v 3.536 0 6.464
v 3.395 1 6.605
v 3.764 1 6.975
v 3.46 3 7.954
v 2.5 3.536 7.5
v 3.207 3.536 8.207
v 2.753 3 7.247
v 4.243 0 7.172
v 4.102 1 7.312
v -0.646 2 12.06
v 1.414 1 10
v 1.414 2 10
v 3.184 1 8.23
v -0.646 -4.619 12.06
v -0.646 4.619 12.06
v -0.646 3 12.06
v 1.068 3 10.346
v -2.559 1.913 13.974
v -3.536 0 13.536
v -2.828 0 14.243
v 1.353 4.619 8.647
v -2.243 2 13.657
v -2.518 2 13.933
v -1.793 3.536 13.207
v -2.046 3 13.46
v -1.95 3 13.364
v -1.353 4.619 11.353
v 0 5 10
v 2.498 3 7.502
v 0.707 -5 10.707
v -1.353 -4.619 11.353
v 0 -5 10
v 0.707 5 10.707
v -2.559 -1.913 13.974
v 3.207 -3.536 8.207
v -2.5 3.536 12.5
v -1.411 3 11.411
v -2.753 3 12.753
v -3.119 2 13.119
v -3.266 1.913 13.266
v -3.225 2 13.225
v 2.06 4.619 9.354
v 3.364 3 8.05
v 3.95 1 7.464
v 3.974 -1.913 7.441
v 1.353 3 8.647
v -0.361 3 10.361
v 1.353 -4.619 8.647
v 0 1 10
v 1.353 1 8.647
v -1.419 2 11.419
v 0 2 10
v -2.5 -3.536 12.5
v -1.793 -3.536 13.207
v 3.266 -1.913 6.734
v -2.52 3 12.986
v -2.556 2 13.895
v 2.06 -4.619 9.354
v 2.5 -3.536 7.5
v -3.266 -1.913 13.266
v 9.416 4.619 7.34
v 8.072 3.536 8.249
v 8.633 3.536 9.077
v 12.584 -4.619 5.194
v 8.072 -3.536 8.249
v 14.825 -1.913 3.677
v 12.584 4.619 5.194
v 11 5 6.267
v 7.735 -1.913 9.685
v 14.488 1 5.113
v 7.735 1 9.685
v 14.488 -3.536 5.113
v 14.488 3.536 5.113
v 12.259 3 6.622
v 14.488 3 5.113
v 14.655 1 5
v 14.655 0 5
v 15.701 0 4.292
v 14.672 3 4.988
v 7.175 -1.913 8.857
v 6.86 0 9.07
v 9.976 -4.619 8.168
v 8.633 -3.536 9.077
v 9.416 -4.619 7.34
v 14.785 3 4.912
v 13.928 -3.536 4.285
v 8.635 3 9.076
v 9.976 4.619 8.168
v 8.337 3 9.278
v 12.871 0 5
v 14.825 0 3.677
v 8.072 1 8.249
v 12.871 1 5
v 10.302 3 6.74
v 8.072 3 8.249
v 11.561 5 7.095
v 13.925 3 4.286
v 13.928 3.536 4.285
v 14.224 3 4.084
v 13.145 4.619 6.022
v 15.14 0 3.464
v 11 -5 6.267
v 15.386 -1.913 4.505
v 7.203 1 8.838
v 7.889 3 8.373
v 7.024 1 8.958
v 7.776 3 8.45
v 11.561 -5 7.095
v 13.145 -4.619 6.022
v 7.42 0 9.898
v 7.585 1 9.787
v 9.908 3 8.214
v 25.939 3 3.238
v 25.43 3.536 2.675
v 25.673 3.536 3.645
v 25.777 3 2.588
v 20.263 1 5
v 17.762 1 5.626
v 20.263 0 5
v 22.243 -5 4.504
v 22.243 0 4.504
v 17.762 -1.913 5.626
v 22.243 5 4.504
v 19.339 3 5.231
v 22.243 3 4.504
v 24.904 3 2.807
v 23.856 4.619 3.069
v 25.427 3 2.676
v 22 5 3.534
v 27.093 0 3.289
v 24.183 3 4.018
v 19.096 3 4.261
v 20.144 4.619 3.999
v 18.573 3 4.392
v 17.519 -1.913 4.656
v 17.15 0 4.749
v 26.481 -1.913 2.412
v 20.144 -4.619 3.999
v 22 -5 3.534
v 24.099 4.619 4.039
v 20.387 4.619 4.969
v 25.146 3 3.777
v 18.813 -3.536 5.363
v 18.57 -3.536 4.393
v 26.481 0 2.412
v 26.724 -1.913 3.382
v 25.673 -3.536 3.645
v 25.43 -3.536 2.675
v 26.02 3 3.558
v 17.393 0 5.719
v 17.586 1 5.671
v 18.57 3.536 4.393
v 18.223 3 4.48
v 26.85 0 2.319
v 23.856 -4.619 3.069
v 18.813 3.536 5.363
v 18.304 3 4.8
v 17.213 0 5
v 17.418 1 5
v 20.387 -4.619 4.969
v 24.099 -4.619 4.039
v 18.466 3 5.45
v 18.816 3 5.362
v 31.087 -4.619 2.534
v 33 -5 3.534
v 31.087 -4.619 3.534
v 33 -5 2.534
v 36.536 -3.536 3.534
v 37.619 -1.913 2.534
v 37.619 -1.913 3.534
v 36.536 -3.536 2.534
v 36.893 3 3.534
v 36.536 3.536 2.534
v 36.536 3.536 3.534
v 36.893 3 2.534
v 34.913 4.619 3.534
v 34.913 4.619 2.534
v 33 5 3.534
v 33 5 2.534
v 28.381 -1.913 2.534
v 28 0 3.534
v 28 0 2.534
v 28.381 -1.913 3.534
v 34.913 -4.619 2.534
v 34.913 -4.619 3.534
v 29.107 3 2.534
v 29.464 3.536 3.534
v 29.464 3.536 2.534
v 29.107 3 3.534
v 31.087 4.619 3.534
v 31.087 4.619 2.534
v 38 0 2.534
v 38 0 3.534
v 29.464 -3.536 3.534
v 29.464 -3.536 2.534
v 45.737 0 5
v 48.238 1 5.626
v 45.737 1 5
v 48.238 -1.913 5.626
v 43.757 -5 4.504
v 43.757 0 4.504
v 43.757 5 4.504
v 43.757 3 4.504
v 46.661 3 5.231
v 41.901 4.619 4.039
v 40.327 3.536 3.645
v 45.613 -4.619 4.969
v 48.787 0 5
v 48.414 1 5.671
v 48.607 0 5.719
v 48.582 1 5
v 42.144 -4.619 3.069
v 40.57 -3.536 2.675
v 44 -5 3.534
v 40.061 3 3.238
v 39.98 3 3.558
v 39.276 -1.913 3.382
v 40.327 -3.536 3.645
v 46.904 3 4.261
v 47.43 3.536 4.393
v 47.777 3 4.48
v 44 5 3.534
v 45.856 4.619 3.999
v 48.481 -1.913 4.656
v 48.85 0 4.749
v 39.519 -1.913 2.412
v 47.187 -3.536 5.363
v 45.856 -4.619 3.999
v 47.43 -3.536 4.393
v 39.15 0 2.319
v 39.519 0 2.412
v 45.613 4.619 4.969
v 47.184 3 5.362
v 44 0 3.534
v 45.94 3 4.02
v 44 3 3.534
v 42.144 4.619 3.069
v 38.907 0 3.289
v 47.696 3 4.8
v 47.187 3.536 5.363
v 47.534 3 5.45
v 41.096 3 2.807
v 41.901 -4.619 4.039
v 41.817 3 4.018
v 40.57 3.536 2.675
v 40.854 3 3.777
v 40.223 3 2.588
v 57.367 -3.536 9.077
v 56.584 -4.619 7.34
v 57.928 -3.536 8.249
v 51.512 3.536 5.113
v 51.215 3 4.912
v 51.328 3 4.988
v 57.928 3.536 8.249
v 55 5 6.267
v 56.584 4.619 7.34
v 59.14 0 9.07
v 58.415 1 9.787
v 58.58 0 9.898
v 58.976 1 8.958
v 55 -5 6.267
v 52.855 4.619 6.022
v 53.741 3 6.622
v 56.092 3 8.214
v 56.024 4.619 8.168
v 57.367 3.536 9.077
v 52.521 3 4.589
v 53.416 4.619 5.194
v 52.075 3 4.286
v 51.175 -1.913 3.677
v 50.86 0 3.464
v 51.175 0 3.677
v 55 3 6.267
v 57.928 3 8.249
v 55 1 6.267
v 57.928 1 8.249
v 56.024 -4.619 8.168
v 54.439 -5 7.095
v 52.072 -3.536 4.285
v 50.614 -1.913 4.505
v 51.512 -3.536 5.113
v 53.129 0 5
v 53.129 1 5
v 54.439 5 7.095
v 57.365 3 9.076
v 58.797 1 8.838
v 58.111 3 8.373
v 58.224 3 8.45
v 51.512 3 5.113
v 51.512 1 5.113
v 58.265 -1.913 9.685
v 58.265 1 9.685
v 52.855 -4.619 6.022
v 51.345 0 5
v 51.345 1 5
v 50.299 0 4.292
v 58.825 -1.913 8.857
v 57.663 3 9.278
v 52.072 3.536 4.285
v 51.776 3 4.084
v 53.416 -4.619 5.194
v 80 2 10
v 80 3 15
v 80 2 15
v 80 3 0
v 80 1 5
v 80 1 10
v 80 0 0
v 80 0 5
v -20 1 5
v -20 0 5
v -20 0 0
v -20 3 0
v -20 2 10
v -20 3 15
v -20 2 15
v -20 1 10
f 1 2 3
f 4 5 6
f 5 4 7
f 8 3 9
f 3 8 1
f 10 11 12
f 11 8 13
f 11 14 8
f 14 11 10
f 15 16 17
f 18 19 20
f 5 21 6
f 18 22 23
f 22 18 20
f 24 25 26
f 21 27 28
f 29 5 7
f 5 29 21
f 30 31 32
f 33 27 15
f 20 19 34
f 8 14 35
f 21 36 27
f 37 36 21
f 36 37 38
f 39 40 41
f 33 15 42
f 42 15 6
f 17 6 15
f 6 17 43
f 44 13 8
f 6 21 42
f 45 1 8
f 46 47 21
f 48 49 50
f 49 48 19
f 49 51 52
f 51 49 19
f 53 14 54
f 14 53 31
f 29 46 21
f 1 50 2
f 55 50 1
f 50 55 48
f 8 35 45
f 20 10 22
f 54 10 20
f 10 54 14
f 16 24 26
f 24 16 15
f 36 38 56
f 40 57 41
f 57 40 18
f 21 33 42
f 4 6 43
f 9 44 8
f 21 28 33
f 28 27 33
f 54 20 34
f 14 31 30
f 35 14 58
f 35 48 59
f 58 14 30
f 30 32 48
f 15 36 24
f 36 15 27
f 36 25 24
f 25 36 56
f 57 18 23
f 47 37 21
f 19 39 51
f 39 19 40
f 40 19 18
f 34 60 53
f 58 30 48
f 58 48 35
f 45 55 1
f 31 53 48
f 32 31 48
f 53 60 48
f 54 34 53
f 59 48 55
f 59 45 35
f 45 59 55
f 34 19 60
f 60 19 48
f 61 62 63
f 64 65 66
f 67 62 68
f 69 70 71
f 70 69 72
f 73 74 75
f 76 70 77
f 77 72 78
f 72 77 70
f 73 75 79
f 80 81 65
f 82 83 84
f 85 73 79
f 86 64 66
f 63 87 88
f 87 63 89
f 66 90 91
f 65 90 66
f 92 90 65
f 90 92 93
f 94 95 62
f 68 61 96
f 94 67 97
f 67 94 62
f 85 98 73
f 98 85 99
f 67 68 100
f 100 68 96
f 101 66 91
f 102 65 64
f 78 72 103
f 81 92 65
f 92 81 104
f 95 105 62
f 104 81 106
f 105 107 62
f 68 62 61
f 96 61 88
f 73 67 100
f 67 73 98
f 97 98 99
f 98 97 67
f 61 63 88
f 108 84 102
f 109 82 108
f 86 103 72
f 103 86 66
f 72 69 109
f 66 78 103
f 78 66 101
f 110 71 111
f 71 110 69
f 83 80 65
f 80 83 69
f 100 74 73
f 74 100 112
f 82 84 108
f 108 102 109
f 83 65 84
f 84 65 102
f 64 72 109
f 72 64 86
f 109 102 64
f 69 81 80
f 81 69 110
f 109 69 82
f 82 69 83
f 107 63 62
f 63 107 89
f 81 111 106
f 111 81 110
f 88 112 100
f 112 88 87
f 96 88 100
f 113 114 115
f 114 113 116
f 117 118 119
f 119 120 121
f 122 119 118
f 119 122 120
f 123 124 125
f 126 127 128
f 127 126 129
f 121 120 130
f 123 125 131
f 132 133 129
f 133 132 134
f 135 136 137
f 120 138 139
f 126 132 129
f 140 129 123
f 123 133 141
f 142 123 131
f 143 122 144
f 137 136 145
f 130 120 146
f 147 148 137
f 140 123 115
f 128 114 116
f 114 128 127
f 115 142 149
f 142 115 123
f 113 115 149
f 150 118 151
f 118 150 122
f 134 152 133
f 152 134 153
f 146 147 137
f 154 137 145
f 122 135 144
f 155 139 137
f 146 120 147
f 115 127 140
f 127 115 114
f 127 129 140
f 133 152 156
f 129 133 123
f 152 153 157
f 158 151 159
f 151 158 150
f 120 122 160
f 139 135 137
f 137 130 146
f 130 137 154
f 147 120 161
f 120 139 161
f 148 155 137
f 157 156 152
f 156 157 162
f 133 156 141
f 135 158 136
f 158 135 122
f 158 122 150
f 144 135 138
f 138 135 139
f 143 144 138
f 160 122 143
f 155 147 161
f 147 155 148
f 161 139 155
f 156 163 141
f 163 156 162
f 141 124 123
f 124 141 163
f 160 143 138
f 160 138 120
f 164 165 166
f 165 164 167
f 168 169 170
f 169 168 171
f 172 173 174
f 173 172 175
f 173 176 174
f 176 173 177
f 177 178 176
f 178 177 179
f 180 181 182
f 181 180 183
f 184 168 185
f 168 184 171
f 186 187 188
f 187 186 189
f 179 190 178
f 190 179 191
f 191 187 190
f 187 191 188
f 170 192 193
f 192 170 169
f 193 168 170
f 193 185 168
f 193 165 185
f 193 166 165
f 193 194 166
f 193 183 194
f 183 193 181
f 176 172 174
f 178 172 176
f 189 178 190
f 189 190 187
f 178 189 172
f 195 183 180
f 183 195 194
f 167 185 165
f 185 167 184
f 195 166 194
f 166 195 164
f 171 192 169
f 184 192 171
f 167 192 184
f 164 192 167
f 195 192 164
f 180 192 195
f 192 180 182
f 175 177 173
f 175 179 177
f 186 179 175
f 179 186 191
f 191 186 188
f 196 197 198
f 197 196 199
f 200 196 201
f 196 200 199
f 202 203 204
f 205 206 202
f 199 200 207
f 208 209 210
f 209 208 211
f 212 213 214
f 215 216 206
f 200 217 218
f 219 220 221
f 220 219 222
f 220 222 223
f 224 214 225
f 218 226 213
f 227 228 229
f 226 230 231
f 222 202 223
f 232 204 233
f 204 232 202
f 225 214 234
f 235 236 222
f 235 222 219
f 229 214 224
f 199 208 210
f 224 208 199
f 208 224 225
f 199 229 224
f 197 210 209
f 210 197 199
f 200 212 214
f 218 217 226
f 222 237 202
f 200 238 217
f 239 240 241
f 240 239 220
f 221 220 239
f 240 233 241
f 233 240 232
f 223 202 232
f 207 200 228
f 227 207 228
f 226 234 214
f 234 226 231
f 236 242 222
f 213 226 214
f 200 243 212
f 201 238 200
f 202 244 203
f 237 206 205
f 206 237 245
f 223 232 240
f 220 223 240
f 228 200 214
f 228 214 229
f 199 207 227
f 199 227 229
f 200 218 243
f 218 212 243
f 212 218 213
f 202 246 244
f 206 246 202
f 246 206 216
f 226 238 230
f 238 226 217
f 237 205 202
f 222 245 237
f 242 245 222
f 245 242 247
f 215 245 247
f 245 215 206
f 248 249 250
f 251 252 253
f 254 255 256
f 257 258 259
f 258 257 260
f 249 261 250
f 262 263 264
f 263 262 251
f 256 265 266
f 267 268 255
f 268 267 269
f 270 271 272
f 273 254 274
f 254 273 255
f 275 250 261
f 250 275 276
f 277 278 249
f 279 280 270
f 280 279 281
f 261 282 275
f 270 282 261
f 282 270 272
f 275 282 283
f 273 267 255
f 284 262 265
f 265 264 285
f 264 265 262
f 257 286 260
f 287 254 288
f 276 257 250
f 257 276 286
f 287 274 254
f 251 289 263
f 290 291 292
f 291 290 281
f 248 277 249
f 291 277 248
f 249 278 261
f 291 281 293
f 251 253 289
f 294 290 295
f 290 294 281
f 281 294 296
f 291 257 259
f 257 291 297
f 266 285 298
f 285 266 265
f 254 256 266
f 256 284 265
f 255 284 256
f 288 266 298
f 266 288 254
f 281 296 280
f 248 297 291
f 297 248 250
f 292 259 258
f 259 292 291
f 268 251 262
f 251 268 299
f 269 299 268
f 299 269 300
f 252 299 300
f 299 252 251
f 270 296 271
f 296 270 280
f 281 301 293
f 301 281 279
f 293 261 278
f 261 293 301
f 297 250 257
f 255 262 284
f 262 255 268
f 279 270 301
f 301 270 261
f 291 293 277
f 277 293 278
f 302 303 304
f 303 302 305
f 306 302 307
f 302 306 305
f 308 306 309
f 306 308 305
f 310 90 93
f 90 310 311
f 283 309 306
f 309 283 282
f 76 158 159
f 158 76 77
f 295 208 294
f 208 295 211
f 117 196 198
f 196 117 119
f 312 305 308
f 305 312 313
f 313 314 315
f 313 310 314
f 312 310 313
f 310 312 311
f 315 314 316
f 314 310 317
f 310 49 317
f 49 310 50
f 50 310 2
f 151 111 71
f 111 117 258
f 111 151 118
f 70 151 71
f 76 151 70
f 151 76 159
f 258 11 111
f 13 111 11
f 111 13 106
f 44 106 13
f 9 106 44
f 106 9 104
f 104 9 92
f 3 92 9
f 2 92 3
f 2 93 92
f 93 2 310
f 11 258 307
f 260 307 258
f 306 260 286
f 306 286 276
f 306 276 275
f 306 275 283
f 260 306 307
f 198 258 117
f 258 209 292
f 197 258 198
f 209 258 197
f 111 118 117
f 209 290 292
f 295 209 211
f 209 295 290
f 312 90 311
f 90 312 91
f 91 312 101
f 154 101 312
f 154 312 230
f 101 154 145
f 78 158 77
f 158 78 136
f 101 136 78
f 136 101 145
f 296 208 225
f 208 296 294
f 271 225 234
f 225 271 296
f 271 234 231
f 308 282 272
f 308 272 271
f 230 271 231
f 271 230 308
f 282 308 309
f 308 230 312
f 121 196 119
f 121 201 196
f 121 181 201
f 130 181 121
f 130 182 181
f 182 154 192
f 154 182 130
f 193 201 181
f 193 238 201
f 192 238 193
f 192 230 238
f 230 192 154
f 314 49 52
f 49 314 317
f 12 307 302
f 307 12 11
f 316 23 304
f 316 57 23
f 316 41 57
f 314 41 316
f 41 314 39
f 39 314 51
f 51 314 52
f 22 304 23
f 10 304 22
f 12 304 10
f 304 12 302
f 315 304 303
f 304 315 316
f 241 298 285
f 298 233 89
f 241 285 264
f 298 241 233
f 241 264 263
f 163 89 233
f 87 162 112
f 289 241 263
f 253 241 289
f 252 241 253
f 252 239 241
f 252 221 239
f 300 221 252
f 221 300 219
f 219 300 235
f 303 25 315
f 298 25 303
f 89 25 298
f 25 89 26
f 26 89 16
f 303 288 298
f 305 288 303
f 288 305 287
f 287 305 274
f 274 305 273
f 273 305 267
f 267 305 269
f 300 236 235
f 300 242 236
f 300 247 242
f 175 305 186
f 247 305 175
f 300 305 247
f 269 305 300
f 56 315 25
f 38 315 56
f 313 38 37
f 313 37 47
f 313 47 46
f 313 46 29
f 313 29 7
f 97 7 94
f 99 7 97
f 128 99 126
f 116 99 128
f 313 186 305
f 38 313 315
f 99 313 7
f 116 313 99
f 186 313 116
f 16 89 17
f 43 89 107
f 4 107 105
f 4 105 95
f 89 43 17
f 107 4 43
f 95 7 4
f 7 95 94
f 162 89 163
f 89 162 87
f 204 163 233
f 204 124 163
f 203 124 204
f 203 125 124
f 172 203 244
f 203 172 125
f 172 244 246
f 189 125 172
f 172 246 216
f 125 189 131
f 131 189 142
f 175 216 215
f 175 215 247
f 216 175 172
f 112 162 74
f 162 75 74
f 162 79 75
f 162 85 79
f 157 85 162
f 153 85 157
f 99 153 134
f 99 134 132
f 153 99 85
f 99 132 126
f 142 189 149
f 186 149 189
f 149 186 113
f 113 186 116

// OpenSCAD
slices=6;
height=10;
sweep_angle=45;
sweep_shift=-30;
height_min=height*0.25+height*0.75*pow(cos(sweep_angle+abs(sweep_shift)),4);
height_swing=height-height_min;
width=10;

base_shift = sweep_shift<0? 0: sweep_shift;

for (i=[0:slices-1]) {
    sweep_slice = base_shift+(180-abs(sweep_shift))/(slices-1)*i;
    pre_sweep = cos(sweep_slice);
    height_slice = base_shift+(180-abs(sweep_shift))/(slices-1)*i;
    sweep_factor = (pre_sweep+pow(pre_sweep,3))/2;
    
    translate([width*1.1*i, 0, 0])
    translate([0, 0, height-height_swing*abs(sin(height_slice))])
    rotate([0, sweep_angle*sweep_factor, 0])
    cylinder(h=1, d=width);
    
}
translate([-20, 0, 0]) {
    cube([100, 1, 5]);
    translate([0, 1, 0])
    cube([100, 1, 10]);
    translate([0, 2, 0])
    cube([100, 1, 15]);
}
